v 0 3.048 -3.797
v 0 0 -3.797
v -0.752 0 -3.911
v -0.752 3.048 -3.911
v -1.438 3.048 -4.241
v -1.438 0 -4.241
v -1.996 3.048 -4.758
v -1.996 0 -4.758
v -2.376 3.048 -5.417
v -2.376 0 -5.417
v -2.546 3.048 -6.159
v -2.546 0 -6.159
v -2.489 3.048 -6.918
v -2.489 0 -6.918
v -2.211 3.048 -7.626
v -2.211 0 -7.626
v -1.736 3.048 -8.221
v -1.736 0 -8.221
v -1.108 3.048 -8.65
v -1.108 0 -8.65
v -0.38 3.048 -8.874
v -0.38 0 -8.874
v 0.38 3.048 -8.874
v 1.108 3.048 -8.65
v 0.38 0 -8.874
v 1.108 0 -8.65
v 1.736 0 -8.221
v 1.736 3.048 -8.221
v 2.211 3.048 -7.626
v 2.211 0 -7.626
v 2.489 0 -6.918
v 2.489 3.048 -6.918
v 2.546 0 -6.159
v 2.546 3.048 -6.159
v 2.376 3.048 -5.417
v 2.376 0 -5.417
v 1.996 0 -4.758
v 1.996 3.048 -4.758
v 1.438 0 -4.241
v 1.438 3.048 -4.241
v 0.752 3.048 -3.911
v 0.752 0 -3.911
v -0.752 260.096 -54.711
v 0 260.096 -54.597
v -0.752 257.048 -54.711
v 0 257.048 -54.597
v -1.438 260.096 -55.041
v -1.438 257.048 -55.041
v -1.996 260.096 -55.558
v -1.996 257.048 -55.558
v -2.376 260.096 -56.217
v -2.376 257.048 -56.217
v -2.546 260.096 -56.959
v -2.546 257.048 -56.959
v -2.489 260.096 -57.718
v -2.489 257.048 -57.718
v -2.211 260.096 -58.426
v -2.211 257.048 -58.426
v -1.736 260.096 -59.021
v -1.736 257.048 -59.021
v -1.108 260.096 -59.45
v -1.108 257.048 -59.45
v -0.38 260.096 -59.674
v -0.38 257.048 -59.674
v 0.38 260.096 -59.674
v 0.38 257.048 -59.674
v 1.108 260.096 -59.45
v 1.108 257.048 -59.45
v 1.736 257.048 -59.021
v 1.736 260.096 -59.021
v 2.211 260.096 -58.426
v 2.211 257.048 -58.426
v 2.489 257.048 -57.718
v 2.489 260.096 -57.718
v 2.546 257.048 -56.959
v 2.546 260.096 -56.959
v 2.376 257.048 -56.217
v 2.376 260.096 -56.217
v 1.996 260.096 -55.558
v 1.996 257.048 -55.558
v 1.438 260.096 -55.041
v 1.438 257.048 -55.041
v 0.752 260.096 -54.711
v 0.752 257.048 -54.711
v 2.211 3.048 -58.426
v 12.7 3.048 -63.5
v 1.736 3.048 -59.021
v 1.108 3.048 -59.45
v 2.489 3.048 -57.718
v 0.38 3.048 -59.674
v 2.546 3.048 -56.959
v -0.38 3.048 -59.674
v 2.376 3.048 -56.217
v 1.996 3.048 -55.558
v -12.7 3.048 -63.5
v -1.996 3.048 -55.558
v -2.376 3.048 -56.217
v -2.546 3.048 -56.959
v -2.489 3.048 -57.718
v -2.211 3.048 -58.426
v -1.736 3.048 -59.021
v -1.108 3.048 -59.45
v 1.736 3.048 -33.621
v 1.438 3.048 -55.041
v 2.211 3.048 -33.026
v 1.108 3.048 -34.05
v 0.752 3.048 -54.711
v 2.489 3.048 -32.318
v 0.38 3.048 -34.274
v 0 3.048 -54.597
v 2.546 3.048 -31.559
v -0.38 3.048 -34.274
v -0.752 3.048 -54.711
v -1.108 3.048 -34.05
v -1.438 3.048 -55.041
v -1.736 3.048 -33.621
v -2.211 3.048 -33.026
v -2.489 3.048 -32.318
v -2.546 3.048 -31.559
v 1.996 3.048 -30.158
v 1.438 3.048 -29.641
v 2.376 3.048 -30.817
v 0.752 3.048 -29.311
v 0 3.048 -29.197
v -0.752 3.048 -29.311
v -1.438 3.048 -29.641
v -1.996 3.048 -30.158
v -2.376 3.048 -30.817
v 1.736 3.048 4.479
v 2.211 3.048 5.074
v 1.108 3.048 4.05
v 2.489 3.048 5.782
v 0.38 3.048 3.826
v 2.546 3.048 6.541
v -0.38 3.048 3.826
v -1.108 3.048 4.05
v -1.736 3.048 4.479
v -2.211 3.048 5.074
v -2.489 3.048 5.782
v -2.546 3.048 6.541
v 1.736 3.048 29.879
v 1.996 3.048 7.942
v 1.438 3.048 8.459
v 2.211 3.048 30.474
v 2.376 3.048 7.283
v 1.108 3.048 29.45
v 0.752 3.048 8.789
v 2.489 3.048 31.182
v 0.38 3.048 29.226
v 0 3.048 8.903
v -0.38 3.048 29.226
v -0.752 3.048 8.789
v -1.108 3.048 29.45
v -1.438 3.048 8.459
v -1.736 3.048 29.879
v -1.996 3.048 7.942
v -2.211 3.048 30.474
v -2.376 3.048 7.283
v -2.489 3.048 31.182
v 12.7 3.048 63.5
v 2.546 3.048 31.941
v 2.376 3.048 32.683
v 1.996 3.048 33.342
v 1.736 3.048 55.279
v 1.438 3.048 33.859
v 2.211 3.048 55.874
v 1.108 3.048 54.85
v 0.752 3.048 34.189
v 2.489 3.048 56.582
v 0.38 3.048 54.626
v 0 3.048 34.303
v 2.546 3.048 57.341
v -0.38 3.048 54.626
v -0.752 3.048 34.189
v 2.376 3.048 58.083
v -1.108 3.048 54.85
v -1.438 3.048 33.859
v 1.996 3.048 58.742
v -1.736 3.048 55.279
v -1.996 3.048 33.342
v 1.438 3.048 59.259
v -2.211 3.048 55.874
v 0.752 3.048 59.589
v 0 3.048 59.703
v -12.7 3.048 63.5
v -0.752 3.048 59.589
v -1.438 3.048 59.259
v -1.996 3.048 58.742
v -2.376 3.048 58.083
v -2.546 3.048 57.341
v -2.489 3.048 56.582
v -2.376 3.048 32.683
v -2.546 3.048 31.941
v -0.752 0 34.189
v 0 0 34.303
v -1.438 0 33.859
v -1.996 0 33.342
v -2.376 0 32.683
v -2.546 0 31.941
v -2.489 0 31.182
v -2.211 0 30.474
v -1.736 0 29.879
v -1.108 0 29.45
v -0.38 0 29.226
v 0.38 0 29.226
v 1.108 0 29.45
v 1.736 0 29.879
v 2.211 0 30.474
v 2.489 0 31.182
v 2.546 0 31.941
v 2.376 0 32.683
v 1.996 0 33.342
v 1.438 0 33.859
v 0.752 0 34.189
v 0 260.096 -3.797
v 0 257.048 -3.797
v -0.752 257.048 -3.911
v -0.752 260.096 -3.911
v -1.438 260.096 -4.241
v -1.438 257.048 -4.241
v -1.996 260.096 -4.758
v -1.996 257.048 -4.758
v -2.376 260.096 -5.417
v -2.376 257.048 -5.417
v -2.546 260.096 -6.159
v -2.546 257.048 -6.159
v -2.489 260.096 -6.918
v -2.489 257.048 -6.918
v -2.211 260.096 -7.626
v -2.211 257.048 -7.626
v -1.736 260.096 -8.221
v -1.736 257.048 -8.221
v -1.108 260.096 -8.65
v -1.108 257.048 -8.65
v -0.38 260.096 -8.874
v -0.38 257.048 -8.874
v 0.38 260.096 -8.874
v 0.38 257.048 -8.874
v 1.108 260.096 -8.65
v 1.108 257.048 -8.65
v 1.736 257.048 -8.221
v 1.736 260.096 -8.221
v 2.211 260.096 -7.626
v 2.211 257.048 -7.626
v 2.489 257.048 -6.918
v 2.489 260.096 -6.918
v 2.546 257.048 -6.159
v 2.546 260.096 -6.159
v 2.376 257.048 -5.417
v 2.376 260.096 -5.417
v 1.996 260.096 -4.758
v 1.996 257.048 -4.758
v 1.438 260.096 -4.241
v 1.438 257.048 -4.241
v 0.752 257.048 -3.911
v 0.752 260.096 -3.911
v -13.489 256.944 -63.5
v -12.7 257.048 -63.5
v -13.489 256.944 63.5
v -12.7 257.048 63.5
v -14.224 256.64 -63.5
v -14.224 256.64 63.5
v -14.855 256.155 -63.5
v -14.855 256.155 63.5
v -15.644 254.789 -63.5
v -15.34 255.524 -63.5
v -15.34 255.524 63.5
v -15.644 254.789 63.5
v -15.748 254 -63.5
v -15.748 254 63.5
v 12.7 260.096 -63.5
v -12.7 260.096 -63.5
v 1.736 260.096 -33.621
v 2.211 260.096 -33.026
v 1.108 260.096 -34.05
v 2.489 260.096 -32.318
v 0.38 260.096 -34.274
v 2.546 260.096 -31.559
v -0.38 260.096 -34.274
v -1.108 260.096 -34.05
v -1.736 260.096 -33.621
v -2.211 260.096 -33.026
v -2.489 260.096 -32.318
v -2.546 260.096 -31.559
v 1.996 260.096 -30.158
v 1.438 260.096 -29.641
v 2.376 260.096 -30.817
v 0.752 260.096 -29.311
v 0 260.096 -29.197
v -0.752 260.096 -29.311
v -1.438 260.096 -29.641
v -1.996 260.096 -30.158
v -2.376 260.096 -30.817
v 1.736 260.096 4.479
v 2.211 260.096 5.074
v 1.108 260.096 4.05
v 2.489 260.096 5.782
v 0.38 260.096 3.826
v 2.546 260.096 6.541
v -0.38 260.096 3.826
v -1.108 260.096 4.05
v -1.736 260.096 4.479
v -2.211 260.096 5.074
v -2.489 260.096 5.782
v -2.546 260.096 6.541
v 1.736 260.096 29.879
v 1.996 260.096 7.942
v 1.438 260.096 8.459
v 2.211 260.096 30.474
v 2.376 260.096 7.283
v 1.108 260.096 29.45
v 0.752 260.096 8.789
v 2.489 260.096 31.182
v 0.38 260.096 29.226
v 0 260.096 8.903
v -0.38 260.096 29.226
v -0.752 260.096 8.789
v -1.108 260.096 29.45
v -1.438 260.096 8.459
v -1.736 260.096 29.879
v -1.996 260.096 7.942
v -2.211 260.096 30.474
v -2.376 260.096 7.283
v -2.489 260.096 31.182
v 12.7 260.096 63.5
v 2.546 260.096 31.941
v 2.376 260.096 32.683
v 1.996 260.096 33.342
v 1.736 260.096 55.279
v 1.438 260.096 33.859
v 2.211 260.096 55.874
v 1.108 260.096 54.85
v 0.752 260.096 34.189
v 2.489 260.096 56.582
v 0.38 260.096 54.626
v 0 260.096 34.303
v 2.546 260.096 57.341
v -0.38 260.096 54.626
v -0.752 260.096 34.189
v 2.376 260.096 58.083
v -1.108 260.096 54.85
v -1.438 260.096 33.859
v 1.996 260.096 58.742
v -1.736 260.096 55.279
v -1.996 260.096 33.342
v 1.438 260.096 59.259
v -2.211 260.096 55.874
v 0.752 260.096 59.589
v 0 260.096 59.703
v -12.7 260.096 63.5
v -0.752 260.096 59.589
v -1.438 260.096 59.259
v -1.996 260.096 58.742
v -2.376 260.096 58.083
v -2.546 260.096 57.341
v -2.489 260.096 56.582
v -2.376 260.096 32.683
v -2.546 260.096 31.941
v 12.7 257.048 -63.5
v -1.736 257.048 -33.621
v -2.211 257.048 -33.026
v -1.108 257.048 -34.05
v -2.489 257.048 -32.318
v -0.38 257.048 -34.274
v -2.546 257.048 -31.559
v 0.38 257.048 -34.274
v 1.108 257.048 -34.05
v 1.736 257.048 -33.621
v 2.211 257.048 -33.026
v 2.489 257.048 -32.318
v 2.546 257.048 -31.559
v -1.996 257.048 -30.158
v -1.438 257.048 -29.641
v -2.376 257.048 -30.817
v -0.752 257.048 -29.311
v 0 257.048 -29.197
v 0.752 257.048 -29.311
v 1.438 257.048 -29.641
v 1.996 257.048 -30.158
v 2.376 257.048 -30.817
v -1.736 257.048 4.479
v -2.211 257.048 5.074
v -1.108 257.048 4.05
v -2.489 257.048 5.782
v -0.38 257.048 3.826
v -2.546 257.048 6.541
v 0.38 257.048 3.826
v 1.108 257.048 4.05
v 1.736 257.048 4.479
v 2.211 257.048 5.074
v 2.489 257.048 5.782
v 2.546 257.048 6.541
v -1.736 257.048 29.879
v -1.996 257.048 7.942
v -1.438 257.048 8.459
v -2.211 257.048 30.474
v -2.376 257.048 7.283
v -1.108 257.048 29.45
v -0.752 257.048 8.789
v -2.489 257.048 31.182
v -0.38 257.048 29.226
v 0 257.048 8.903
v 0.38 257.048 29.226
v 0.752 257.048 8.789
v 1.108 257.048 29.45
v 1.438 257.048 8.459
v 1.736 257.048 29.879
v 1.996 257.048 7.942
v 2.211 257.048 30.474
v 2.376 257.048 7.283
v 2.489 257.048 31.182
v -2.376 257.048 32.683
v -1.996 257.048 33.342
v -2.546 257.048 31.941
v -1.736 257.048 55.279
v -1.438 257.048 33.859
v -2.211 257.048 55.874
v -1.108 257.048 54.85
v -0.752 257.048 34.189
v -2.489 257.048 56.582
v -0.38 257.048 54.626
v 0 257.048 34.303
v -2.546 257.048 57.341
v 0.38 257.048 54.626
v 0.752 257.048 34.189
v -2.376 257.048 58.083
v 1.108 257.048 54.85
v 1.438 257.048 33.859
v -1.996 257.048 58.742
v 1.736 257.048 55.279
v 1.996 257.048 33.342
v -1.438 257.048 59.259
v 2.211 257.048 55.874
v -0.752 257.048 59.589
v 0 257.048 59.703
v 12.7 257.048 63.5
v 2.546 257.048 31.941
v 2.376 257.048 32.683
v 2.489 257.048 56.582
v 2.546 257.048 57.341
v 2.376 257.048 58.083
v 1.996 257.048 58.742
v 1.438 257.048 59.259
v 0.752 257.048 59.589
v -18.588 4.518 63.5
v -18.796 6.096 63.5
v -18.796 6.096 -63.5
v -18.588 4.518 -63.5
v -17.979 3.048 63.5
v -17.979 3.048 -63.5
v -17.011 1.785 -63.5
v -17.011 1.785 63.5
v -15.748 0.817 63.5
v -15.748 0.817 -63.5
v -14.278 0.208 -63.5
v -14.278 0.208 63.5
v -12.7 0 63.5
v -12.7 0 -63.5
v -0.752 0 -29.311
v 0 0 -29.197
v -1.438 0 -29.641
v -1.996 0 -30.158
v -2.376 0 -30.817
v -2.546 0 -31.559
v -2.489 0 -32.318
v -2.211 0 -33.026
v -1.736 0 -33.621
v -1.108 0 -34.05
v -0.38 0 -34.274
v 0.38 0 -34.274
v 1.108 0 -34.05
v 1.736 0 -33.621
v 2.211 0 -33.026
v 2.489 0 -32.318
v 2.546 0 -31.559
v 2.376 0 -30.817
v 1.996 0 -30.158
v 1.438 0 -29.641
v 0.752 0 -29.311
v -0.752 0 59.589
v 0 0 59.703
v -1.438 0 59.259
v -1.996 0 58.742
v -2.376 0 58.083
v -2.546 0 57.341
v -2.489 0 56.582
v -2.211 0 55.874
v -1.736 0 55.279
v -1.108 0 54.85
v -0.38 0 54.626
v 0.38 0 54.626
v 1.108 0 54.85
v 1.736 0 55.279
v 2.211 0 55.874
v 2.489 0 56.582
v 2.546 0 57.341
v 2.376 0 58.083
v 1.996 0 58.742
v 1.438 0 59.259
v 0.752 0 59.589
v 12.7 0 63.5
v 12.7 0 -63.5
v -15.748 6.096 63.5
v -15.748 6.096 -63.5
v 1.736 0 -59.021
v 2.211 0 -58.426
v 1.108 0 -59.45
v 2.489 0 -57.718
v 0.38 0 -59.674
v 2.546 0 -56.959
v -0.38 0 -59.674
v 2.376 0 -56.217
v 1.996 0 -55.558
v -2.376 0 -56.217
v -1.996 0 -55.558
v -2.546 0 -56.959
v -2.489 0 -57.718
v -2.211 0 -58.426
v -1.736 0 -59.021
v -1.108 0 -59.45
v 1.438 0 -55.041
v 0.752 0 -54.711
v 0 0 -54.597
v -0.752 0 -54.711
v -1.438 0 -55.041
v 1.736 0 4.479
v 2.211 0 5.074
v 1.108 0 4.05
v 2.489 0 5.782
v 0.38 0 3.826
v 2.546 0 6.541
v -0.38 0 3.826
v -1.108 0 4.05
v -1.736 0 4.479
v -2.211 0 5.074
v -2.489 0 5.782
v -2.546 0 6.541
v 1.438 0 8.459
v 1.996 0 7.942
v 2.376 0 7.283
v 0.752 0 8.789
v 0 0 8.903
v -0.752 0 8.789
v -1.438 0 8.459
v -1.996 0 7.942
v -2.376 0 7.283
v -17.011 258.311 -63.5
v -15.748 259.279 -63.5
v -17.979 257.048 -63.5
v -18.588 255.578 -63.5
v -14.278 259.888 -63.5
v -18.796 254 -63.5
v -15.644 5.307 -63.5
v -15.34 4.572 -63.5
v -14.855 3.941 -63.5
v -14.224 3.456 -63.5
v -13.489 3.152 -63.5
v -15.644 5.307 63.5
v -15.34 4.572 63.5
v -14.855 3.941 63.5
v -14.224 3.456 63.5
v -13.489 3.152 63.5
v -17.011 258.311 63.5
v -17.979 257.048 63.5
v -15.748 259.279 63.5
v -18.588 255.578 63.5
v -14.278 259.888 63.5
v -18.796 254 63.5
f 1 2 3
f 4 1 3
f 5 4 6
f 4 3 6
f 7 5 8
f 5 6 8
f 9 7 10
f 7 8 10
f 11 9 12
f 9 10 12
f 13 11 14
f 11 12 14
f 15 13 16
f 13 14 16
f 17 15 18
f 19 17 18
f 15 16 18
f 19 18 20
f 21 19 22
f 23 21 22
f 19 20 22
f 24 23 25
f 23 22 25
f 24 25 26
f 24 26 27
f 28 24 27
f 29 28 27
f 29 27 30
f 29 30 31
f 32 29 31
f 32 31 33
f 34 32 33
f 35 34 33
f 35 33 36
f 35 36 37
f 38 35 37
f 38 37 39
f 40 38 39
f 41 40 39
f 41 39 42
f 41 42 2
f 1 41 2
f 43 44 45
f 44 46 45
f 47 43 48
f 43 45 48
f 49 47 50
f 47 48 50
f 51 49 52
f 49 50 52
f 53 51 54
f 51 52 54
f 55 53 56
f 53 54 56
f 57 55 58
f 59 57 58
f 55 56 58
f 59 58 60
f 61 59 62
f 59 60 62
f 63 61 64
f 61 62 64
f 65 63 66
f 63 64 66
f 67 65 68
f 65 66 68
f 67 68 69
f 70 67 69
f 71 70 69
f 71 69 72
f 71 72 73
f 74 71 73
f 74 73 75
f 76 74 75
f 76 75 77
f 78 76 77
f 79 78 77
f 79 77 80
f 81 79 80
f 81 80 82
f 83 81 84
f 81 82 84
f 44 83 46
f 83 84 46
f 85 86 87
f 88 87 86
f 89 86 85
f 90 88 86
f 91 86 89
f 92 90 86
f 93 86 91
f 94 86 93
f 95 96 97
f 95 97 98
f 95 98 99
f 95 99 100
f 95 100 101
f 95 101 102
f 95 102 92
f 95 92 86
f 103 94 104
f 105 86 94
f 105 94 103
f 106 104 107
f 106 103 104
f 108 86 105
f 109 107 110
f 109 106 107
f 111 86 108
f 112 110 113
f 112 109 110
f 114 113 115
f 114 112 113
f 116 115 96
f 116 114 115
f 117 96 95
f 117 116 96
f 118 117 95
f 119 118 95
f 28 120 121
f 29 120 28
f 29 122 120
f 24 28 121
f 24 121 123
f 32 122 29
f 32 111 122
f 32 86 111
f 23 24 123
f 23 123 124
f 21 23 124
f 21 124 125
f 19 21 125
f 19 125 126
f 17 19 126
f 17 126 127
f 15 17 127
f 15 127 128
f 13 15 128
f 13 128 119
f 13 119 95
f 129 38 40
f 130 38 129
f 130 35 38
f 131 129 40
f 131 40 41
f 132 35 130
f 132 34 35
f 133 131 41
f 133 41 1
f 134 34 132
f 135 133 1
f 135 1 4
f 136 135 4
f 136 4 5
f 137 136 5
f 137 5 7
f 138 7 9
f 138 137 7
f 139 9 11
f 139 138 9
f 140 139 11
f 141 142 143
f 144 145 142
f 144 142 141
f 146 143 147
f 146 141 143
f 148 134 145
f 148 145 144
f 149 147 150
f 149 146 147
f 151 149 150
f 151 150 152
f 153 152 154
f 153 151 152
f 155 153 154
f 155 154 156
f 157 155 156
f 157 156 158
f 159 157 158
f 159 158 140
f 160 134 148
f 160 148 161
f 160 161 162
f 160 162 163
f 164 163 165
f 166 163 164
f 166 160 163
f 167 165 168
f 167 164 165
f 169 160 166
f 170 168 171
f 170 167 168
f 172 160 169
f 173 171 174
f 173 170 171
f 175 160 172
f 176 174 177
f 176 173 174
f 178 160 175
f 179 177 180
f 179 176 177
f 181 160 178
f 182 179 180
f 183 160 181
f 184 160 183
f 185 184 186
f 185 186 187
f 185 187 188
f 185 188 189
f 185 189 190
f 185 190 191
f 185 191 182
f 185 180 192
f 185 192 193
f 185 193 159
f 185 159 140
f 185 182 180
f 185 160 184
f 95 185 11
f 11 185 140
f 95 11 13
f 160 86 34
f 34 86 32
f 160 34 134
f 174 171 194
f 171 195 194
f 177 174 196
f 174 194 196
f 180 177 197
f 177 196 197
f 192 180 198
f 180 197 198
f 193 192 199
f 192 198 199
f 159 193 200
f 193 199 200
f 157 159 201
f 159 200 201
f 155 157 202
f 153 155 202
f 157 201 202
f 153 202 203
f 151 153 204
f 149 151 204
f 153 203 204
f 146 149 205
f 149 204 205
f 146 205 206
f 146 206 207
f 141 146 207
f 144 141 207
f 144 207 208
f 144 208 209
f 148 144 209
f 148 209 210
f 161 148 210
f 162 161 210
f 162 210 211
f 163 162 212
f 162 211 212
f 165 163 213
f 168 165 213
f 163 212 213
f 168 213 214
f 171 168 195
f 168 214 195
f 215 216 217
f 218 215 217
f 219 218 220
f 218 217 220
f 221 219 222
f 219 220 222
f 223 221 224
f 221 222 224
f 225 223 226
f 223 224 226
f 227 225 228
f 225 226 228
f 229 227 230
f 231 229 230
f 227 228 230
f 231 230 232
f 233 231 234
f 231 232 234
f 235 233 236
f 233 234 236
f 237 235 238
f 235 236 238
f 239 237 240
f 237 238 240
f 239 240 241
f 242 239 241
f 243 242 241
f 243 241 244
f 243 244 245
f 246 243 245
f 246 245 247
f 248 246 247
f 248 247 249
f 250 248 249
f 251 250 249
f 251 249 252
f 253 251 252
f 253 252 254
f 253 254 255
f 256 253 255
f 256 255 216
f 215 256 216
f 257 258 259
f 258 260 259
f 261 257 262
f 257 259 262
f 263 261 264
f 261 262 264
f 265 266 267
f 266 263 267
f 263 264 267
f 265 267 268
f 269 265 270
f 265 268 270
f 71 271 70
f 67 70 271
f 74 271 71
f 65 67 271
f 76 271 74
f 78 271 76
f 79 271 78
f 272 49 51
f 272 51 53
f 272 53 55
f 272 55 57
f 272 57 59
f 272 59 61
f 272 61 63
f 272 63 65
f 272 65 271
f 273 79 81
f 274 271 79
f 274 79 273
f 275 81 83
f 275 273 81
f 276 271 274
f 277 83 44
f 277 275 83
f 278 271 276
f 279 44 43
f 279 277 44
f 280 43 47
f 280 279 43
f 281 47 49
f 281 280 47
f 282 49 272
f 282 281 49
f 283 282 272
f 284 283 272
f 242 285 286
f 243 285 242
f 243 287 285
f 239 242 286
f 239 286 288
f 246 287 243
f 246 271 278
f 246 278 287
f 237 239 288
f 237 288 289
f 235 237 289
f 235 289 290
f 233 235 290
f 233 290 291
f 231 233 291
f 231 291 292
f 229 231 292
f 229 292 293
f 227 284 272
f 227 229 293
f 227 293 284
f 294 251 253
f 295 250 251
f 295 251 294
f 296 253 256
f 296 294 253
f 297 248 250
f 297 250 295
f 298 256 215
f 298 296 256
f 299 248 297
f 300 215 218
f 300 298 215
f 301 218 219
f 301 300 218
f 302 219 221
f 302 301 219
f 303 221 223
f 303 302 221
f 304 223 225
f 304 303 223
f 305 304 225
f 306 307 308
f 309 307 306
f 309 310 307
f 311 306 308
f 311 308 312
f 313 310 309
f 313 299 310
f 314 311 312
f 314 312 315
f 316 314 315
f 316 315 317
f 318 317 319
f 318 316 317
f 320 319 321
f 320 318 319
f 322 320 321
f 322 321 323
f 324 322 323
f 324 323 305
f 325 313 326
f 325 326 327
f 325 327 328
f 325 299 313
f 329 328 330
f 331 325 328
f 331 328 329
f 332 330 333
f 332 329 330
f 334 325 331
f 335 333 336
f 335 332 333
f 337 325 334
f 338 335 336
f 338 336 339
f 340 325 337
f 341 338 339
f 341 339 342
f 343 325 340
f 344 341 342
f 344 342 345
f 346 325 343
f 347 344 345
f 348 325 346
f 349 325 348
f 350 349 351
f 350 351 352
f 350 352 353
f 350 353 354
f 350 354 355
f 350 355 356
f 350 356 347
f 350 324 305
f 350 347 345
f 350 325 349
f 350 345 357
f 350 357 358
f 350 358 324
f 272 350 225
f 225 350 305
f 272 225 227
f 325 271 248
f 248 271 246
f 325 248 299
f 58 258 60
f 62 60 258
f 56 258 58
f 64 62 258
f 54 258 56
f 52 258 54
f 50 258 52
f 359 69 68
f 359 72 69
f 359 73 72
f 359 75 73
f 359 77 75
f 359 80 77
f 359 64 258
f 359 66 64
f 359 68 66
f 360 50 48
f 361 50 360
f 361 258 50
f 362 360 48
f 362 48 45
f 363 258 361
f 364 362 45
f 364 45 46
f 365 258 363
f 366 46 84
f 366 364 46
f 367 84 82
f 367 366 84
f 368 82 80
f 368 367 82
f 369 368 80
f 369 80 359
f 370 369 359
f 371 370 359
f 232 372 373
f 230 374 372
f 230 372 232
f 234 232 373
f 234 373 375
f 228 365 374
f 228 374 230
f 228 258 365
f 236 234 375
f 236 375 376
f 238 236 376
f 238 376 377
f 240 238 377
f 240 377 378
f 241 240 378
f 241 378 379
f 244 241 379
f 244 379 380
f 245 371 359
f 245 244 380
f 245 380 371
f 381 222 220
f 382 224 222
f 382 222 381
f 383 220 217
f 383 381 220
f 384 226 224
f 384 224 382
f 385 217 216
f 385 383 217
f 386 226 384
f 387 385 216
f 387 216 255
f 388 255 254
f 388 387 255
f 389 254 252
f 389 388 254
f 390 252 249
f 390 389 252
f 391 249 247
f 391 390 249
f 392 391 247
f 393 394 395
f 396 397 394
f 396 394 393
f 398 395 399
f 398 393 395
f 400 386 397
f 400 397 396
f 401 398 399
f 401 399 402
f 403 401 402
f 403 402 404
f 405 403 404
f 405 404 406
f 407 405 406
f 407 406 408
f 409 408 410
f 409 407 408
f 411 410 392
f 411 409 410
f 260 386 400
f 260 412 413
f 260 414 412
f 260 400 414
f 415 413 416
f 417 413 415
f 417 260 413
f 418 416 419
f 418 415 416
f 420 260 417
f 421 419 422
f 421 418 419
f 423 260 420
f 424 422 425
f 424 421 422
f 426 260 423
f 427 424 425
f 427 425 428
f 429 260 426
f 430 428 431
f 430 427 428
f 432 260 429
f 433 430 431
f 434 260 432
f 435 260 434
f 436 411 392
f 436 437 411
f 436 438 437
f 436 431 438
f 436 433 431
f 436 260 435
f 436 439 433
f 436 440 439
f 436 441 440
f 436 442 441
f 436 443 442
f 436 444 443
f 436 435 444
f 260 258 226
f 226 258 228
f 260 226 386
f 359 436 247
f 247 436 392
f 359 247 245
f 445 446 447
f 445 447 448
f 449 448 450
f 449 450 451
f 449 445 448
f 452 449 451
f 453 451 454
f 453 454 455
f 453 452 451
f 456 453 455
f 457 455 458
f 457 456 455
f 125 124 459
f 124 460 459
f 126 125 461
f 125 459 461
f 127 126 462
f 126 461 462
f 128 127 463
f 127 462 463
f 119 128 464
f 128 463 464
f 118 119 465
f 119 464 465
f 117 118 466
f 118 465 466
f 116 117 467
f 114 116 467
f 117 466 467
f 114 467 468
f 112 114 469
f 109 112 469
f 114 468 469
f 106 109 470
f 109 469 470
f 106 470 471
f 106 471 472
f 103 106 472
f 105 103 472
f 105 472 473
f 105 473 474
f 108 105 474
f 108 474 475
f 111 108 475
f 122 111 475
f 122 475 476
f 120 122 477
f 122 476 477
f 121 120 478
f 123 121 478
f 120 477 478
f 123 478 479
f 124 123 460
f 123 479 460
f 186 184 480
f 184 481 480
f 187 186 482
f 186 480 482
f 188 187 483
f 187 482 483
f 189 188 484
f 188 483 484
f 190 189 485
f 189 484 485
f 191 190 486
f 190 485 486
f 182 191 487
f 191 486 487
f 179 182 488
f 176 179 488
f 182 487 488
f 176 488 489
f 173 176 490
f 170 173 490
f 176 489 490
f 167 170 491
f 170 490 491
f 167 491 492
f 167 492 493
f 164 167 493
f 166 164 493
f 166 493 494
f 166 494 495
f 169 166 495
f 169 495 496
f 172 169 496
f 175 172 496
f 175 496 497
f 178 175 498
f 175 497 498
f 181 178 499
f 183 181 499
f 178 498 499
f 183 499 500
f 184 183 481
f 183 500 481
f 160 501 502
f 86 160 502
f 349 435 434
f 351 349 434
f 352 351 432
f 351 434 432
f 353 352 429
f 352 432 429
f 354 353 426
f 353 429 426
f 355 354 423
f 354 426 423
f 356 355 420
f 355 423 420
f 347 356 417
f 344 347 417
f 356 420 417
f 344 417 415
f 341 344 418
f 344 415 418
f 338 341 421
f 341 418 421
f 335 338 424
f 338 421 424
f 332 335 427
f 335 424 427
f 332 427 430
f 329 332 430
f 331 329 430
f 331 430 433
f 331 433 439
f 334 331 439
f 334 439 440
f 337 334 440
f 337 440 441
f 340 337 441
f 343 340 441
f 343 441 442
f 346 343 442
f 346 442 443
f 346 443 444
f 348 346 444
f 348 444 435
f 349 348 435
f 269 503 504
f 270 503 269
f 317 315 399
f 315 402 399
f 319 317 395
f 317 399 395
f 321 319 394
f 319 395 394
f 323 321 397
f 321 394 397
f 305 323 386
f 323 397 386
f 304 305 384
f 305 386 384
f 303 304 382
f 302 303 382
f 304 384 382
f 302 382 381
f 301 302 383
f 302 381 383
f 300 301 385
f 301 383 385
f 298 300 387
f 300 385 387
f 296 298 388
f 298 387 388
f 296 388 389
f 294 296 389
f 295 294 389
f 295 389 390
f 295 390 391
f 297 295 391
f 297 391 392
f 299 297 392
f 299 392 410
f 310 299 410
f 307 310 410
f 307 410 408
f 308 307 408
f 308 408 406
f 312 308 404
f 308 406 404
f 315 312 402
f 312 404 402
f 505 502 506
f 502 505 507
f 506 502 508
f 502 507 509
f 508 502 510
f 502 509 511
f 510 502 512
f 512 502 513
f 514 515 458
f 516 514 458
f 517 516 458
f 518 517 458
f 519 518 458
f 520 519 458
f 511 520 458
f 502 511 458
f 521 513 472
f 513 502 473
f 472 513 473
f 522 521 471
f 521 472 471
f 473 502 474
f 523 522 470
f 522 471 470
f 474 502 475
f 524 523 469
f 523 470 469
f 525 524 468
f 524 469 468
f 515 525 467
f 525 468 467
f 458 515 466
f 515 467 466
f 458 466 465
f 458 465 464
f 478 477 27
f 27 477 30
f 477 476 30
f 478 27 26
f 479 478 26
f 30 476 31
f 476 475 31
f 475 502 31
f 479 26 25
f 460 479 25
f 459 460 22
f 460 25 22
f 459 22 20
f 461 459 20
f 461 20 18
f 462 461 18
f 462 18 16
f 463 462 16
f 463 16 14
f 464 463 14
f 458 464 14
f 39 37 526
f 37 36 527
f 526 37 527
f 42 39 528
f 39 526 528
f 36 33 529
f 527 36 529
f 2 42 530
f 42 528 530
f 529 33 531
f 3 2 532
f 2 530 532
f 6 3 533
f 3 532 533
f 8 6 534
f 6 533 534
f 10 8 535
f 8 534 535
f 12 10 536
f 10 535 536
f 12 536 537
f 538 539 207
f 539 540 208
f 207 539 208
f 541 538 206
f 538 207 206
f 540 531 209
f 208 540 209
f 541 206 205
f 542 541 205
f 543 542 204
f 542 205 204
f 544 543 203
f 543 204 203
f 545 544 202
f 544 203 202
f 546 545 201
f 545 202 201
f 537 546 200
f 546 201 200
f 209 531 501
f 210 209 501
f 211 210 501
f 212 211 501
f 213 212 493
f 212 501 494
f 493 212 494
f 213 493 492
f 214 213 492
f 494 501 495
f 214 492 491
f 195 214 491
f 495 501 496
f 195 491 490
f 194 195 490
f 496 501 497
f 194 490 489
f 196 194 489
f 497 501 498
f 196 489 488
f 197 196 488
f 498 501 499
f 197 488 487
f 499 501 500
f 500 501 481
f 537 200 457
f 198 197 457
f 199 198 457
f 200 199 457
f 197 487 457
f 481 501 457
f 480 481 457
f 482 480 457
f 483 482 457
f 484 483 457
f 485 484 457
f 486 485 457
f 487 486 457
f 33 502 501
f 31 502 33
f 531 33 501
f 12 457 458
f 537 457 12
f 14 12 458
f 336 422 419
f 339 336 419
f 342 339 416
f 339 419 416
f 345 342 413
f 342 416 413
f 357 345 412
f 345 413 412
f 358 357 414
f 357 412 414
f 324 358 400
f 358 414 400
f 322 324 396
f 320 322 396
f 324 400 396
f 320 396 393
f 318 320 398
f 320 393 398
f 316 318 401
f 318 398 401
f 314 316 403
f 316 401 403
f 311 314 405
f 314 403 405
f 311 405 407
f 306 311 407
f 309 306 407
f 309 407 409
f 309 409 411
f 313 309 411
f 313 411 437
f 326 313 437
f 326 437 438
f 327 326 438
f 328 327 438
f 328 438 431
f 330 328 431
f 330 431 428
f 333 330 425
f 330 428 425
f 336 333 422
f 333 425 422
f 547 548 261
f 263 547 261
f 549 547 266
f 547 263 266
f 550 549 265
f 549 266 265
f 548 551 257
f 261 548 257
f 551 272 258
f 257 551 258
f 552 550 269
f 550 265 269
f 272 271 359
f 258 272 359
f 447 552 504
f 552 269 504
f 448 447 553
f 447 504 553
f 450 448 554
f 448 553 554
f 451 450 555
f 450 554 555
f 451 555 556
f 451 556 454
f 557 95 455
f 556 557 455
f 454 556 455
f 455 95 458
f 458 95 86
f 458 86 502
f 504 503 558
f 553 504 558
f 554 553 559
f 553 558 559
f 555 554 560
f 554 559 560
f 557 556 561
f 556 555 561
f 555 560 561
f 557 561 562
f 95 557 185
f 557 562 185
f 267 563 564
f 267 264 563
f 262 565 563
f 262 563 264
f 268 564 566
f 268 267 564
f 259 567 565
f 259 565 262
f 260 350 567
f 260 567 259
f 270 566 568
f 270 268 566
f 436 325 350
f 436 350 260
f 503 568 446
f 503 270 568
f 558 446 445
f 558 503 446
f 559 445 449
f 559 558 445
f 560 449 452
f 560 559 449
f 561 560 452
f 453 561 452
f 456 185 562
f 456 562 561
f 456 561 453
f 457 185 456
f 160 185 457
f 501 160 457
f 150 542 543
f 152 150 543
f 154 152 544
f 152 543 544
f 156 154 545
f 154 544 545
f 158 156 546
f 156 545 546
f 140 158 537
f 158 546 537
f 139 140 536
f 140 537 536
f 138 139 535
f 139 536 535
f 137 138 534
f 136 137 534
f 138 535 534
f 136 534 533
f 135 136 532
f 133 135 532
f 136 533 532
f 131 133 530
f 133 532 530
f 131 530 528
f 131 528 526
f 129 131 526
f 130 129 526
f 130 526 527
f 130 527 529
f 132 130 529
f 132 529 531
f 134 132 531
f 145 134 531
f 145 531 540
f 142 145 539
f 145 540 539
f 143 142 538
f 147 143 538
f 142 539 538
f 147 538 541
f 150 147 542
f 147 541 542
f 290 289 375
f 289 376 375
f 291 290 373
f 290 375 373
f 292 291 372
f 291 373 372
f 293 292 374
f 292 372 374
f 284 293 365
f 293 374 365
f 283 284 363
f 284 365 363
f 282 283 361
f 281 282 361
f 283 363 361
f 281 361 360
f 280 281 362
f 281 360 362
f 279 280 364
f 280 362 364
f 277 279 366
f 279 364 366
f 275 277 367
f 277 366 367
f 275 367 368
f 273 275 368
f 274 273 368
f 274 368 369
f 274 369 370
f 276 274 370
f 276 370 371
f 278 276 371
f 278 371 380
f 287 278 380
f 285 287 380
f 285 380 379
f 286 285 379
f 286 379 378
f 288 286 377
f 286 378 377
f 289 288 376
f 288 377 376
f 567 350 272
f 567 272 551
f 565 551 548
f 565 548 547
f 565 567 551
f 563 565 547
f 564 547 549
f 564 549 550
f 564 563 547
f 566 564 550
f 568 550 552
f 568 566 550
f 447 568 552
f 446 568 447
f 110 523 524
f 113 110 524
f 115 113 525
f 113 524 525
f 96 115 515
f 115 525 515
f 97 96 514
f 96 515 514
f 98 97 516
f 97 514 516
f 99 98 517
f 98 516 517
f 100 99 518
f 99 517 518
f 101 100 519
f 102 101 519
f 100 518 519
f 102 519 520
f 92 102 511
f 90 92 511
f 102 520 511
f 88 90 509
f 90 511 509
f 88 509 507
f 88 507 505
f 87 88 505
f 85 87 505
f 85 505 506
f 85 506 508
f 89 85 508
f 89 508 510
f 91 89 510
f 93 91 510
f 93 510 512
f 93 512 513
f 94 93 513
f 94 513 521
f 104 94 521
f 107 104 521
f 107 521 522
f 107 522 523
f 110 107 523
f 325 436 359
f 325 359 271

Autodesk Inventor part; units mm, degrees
ref_plane "YZ Plane" through (0, 0, 0) normal (1, 0, 0) x (0, 1, 0)
ref_plane "XZ Plane" through (0, 0, 0) normal (0, 1, 0) x (-1, 0, 0)
ref_plane "XY Plane" through (0, 0, 0) normal (0, 0, 1) x (1, 0, 0)
sketch "Sketch1" plane through (0, 0, 0) normal (0, 1, 0) x (-1, 0, 0)
  line L0 (-12.7, -63.5) -> (12.7, -63.5)
  line L1 (12.7, -63.5) -> (12.7, 63.5)
  line L2 (12.7, 63.5) -> (-12.7, 63.5)
  line L3 (-12.7, 63.5) -> (-12.7, -63.5)
  line L4 (-12.7, -63.5) -> (12.7, 63.5) construction
  line L5 (12.7, -63.5) -> (-12.7, 63.5) construction
  point P0 (0, 0)
  dimension "d0" = 25.4
  dimension "d1" = 127
extrude "Plate1" add sketch "Sketch1" along normal blind 3.048
sketch "Sketch2" plane through (-15.748, 6.096, 63.5) normal (-1, 0, 0) x (0, -1, 0)
  line L0 (0, -127) -> (0, 0)
  line L1 (0, 0) -> (-247.904, 0)
  line L2 (-247.904, 0) -> (-247.904, -127)
  line L3 (-247.904, -127) -> (0, -127)
edge flange "Flange1" height 254 angle 90 thickness 3.048 bend radius 3.048 thickness toward (-1, 0, 0) relief tear relief width 3.048 relief depth 1.524 edges at (-12.7, 3.048, 0) wall of the first edge with corners at (-15.748, 6.096, -63.5) (-15.748, 6.096, 63.5) (-15.748, 254, 63.5) (-15.748, 254, -63.5)
bend "Bend1"
corner "Corner1"
sketch "Sketch3" plane through (0, 3.048, 0) normal (0, 1, 0) x (1, 0, 0)
  line L0 (-12.7, 63.5) -> (12.7, 63.5) construction
  line L1 (-12.7, -63.5) -> (-12.7, 63.5) construction
  line L2 (12.7, -63.5) -> (-12.7, -63.5) construction
  line L3 (12.7, 63.5) -> (12.7, -63.5) construction
  line L4 (12.7, 0) -> (-12.7, 0) construction
  point P0 (0, 0)
  point P1 (0, -6.35)
  point P2 (0, 0)
  point P3 (0, -31.75)
  point P4 (0, -57.15)
  point P5 (0, -82.55)
  point P6 (0, -107.95)
  point P7 (0, 6.35)
  point P8 (0, 31.75)
  point P9 (0, 57.15)
  point P10 (0, 82.55)
  point P11 (0, 107.95)
  dimension "d13" = 6.35
  dimension "d16" = 25.4
  dimension "d21" = 12.7
hole "Hole1" at (0, 3.048, 6.35) at (0, 3.048, 31.75) at (0, 3.048, 57.15) at (0, 3.048, 82.55) at (0, 3.048, -82.55) at (0, 3.048, -57.15) at (0, 3.048, -31.75) at (0, 3.048, -6.35) direction (0, -1, 0) diameter 5.1054 end through all clearance for "Flat Head Machine Screw (82)" size "#10" standard "Ansi Unified Screw Threads"
sketch "Sketch4" plane through (-12.7, 257.048, 63.5) normal (0, 1, 0) x (-1, 0, 0)
  line L0 (0, -127) -> (0, 0)
  line L1 (0, 0) -> (-25.4, 0)
  line L2 (-25.4, 0) -> (-25.4, -127)
  line L3 (-25.4, -127) -> (0, -127)
edge flange "Flange2" height 31.496 angle 90 thickness 3.048 bend radius 3.048 thickness toward (0, 1, 0) relief tear relief width 3.048 relief depth 1.524 edges at (-15.748, 254, 0) wall of the first edge with corners at (-12.7, 257.048, -63.5) (-12.7, 257.048, 63.5) (12.7, 257.048, 63.5) (12.7, 257.048, -63.5)
bend "Bend2"
corner "Corner2"
sketch "Sketch5" plane through (12.7, 260.096, 63.5) normal (0, 1, 0) x (1, 0, 0)
  circle A0 centre (-12.7, 6.35) radius 2.5527 construction
  circle A1 centre (-12.7, 31.75) radius 2.5527 construction
  circle A2 centre (-12.7, 57.15) radius 2.5527 construction
  circle A3 centre (-12.7, 69.85) radius 2.5527 construction
  circle A4 centre (-12.7, 95.25) radius 2.5527 construction
  circle A5 centre (-12.7, 120.65) radius 2.5527 construction
  point P0 (-12.7, 63.5)
  point P1 (-12.7, 6.35)
  point P2 (-12.7, 31.75)
  point P3 (-12.7, 57.15)
  point P4 (-12.7, 69.85)
  point P5 (-12.7, 95.25)
  point P6 (-12.7, 120.65)
hole "Hole2" at (0, 260.096, 57.15) at (0, 260.096, 31.75) at (0, 260.096, 6.35) at (0, 260.096, -6.35) at (0, 260.096, -31.75) at (0, 260.096, -57.15) direction (0, -1, 0) diameter 5.1054 end through all clearance for "Flat Head Machine Screw (82)" size "#10" standard "Ansi Unified Screw Threads"
equation "\"d27\" = Thickness"
equation "\"d44\" = Thickness"
equation "\"d2\" = Thickness"
equation "\"d3\" = BendReliefWidth"
equation "\"d4\" = BendReliefDepth"
equation "\"d5\" = MinimumRemnant"
equation "\"d6\" = TransitionRadius"
equation "\"d9\" = BendRadius"
equation "\"d10\" = CornerReliefSize"
equation "\"d11\" = GapSize"
equation "\"d12\" = JacobiRadiusSize"
equation "\"d29\" = BendReliefWidth"
equation "\"d30\" = BendReliefDepth"
equation "\"d31\" = MinimumRemnant"
equation "\"d32\" = TransitionRadius"
equation "\"d35\" = BendRadius"
equation "\"d36\" = CornerReliefSize"
equation "\"d37\" = GapSize"
equation "\"d38\" = JacobiRadiusSize"
equation "\"BendRadius\" = Thickness"
equation "\"BendReliefWidth\" = Thickness"
equation "\"BendReliefDepth\" = 0.5 * Thickness"
equation "\"CornerReliefSize\" = 4 * Thickness"
equation "\"MinimumRemnant\" = 2 * Thickness"
equation "\"TransitionRadius\" = BendRadius"
equation "\"JacobiRadiusSize\" = BendRadius"
equation "\"GapSize\" = Thickness"
equation "\"Thickness\" = 3.048"
properties part number "trough_back_support" material "Aluminum 6061"
